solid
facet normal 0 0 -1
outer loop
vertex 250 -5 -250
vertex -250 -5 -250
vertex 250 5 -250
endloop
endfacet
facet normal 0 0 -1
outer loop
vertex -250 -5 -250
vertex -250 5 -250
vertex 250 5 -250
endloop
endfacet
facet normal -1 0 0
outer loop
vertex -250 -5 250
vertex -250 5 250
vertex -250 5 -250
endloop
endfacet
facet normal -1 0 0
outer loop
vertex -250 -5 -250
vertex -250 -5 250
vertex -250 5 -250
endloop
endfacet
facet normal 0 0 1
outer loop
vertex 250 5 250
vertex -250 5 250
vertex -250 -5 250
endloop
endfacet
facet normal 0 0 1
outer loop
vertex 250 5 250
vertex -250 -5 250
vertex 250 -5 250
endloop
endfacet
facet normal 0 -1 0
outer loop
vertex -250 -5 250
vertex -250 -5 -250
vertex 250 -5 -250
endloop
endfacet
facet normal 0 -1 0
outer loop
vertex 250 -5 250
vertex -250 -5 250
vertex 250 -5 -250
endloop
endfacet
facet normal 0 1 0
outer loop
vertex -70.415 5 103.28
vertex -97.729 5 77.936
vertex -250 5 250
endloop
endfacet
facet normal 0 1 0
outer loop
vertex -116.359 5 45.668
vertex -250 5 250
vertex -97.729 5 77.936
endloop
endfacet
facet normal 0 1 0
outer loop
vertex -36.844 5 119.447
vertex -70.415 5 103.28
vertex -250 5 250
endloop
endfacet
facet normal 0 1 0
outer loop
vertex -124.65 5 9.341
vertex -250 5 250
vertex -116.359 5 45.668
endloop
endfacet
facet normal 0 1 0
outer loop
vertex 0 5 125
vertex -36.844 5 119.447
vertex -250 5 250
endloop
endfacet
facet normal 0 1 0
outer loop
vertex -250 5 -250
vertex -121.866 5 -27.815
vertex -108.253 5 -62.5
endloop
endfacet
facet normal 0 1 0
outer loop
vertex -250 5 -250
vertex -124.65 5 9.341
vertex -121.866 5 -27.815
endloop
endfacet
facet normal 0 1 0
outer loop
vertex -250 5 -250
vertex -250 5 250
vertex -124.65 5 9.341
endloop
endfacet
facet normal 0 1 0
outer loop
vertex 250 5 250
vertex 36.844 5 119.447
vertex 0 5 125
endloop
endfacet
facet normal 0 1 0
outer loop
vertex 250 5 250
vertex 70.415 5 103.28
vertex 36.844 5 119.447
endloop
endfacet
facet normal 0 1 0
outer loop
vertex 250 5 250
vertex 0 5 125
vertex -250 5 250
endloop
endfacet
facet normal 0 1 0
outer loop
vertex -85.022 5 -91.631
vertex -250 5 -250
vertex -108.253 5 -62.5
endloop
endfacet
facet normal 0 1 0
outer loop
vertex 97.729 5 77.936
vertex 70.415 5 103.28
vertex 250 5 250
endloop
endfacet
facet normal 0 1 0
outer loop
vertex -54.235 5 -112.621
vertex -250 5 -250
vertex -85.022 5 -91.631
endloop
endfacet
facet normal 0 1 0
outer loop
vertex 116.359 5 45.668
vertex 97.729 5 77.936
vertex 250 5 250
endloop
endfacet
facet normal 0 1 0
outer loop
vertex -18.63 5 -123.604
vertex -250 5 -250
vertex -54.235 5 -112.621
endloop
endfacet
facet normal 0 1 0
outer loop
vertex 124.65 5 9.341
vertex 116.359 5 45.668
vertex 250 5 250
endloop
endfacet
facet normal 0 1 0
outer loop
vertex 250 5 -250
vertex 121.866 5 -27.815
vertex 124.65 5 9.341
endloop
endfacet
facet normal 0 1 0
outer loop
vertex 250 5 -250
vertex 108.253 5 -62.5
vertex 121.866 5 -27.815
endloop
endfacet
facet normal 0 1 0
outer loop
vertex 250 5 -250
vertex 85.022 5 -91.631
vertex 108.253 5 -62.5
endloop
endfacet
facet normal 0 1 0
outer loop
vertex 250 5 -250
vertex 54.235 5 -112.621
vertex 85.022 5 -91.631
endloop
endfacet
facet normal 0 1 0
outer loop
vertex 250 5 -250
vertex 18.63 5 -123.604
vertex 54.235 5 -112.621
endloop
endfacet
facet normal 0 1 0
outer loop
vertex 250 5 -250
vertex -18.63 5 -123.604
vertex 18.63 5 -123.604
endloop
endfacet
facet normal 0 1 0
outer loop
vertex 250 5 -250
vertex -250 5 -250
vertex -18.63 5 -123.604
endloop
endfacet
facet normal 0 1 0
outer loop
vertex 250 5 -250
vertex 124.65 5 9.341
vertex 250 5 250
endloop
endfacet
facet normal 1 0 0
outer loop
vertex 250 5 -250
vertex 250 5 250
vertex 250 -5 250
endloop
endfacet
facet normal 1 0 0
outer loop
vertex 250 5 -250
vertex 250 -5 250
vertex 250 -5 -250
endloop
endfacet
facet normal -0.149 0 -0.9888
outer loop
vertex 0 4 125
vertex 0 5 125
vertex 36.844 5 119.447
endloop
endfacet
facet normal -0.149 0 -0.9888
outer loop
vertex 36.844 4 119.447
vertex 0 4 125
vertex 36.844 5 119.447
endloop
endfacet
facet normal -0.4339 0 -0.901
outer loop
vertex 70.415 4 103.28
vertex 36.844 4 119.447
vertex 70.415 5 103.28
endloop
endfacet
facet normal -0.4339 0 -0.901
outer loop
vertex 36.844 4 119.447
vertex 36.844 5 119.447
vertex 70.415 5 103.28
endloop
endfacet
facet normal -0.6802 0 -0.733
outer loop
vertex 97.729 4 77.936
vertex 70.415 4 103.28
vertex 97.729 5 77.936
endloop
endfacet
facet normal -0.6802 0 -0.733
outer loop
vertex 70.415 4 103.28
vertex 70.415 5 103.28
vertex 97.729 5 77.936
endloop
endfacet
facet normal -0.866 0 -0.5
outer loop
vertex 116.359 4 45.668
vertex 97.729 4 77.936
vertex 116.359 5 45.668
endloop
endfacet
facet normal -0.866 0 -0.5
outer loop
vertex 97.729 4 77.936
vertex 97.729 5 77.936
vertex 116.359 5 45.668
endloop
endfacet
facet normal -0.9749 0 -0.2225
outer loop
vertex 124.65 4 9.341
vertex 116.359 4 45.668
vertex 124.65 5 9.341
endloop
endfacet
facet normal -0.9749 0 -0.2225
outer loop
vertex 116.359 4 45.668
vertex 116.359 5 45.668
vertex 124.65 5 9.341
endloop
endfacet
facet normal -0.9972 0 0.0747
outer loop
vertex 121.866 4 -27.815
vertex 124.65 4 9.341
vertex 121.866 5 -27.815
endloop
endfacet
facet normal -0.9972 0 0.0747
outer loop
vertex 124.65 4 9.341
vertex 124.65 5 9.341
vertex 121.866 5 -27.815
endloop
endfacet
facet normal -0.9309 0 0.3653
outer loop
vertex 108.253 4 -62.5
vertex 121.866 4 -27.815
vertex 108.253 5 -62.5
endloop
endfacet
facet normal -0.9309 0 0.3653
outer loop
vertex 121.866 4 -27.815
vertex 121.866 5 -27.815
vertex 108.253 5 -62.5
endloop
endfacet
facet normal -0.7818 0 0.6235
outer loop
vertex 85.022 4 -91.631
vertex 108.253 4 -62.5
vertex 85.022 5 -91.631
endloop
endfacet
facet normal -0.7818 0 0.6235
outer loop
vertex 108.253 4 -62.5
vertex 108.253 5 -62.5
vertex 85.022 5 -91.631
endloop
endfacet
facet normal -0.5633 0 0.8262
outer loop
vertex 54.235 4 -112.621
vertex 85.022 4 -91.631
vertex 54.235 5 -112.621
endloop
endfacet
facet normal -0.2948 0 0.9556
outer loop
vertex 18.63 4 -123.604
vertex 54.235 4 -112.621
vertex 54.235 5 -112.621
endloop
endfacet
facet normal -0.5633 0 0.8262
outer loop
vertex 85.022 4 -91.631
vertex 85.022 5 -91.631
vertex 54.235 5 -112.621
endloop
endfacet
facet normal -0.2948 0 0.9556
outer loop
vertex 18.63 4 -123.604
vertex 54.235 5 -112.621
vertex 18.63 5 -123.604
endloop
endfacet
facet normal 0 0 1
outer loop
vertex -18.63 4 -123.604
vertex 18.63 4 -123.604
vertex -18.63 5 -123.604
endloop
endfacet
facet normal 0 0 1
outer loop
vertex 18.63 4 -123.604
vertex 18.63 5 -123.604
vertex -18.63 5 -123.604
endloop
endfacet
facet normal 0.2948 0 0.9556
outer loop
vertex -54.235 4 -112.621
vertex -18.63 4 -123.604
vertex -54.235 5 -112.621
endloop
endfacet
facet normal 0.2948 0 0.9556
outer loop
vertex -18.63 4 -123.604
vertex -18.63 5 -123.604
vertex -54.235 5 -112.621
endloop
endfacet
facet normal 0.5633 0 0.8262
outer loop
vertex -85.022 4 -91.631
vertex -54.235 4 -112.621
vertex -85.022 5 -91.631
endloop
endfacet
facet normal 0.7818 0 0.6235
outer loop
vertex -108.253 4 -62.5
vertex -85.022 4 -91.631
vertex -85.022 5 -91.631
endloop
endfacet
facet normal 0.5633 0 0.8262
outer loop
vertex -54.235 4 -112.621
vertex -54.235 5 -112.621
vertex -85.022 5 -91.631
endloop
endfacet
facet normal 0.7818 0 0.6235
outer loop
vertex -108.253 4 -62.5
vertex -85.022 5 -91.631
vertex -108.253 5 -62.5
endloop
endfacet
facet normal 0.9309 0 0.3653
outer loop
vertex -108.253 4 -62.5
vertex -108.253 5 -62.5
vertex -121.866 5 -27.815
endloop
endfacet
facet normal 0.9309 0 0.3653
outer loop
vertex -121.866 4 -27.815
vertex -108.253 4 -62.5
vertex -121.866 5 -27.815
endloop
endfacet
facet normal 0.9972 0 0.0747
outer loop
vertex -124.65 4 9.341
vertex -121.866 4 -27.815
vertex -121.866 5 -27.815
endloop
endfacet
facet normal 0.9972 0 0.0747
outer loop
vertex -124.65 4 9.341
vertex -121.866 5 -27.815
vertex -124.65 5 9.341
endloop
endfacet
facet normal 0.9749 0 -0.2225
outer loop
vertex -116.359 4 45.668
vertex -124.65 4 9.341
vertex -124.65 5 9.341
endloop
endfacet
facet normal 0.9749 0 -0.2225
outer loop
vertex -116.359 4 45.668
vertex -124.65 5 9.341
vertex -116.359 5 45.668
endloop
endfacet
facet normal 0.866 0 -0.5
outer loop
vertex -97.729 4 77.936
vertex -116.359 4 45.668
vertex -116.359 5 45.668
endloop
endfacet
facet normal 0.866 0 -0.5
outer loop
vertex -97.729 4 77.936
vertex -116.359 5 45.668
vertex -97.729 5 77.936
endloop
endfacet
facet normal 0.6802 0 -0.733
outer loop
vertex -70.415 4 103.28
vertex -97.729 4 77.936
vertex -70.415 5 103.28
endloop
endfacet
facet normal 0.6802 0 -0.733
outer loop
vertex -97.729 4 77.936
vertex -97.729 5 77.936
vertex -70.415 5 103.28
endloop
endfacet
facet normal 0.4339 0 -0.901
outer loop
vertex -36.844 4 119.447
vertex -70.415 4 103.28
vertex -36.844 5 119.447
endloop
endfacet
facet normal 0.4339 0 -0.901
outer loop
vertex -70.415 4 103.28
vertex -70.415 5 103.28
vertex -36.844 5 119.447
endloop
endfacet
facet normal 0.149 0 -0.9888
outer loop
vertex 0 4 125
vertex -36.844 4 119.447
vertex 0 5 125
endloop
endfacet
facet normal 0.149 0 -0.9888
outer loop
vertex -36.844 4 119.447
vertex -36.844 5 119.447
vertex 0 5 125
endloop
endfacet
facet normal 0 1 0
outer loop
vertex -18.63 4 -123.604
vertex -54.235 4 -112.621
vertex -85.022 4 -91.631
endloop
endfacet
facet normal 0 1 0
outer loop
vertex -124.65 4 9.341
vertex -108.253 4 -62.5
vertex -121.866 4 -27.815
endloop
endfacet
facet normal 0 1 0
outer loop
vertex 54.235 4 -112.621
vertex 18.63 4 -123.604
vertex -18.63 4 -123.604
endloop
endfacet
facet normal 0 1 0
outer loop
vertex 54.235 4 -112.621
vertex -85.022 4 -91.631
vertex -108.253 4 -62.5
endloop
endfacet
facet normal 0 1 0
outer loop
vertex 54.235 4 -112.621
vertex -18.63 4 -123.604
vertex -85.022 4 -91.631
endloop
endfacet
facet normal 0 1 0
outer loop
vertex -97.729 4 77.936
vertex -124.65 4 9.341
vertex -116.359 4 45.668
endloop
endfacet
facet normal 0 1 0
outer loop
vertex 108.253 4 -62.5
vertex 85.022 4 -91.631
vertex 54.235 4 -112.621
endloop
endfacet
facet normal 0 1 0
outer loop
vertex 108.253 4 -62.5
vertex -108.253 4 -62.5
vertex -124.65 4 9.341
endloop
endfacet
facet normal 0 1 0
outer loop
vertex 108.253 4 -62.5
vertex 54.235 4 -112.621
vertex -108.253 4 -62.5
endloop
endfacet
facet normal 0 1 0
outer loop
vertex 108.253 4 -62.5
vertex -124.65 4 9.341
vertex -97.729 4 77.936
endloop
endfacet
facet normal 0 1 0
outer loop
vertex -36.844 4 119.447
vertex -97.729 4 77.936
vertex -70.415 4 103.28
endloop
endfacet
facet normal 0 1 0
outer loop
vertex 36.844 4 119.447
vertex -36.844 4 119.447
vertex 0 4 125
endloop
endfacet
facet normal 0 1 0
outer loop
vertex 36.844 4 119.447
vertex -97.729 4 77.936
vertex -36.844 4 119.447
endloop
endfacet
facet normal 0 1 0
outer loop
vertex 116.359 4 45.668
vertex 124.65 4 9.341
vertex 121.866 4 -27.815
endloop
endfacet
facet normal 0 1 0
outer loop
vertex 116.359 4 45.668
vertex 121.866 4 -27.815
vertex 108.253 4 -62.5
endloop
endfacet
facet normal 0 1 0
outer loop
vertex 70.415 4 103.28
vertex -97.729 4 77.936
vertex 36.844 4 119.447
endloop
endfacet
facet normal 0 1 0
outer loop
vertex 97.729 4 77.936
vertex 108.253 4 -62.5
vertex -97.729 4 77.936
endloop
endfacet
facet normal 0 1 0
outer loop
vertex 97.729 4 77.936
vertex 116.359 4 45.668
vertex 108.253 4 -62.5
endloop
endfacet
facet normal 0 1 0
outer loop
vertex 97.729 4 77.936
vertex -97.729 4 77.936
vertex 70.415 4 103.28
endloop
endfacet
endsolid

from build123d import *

# Parameters (mm, degrees)
SKETCH1_W           = 500
SKETCH1_H           = 500
BOSS_EXTRUDE1_DEPTH = 5
SKETCH2_R           = 125
CUT_EXTRUDE1_DEPTH  = 1


with BuildPart() as part:
    # Sketch1 → Boss-Extrude1 (new, symmetric)
    with BuildSketch(Plane(origin=(0, 0, 0), x_dir=(1, 0, 0), z_dir=(0, 1, 0))):
        Rectangle(SKETCH1_W, SKETCH1_H)
    extrude(amount=BOSS_EXTRUDE1_DEPTH, both=True)

    # Sketch2 → Cut-Extrude1 (cut)
    with BuildSketch(Plane(origin=(0, 5, 0), x_dir=(1, 0, 0), z_dir=(0, 1, 0))):
        with Locations(Location((0, 0, 0), (0, 0, 270))):
            Circle(SKETCH2_R)
    extrude(amount=-CUT_EXTRUDE1_DEPTH, mode=Mode.SUBTRACT)


solid = part.part
